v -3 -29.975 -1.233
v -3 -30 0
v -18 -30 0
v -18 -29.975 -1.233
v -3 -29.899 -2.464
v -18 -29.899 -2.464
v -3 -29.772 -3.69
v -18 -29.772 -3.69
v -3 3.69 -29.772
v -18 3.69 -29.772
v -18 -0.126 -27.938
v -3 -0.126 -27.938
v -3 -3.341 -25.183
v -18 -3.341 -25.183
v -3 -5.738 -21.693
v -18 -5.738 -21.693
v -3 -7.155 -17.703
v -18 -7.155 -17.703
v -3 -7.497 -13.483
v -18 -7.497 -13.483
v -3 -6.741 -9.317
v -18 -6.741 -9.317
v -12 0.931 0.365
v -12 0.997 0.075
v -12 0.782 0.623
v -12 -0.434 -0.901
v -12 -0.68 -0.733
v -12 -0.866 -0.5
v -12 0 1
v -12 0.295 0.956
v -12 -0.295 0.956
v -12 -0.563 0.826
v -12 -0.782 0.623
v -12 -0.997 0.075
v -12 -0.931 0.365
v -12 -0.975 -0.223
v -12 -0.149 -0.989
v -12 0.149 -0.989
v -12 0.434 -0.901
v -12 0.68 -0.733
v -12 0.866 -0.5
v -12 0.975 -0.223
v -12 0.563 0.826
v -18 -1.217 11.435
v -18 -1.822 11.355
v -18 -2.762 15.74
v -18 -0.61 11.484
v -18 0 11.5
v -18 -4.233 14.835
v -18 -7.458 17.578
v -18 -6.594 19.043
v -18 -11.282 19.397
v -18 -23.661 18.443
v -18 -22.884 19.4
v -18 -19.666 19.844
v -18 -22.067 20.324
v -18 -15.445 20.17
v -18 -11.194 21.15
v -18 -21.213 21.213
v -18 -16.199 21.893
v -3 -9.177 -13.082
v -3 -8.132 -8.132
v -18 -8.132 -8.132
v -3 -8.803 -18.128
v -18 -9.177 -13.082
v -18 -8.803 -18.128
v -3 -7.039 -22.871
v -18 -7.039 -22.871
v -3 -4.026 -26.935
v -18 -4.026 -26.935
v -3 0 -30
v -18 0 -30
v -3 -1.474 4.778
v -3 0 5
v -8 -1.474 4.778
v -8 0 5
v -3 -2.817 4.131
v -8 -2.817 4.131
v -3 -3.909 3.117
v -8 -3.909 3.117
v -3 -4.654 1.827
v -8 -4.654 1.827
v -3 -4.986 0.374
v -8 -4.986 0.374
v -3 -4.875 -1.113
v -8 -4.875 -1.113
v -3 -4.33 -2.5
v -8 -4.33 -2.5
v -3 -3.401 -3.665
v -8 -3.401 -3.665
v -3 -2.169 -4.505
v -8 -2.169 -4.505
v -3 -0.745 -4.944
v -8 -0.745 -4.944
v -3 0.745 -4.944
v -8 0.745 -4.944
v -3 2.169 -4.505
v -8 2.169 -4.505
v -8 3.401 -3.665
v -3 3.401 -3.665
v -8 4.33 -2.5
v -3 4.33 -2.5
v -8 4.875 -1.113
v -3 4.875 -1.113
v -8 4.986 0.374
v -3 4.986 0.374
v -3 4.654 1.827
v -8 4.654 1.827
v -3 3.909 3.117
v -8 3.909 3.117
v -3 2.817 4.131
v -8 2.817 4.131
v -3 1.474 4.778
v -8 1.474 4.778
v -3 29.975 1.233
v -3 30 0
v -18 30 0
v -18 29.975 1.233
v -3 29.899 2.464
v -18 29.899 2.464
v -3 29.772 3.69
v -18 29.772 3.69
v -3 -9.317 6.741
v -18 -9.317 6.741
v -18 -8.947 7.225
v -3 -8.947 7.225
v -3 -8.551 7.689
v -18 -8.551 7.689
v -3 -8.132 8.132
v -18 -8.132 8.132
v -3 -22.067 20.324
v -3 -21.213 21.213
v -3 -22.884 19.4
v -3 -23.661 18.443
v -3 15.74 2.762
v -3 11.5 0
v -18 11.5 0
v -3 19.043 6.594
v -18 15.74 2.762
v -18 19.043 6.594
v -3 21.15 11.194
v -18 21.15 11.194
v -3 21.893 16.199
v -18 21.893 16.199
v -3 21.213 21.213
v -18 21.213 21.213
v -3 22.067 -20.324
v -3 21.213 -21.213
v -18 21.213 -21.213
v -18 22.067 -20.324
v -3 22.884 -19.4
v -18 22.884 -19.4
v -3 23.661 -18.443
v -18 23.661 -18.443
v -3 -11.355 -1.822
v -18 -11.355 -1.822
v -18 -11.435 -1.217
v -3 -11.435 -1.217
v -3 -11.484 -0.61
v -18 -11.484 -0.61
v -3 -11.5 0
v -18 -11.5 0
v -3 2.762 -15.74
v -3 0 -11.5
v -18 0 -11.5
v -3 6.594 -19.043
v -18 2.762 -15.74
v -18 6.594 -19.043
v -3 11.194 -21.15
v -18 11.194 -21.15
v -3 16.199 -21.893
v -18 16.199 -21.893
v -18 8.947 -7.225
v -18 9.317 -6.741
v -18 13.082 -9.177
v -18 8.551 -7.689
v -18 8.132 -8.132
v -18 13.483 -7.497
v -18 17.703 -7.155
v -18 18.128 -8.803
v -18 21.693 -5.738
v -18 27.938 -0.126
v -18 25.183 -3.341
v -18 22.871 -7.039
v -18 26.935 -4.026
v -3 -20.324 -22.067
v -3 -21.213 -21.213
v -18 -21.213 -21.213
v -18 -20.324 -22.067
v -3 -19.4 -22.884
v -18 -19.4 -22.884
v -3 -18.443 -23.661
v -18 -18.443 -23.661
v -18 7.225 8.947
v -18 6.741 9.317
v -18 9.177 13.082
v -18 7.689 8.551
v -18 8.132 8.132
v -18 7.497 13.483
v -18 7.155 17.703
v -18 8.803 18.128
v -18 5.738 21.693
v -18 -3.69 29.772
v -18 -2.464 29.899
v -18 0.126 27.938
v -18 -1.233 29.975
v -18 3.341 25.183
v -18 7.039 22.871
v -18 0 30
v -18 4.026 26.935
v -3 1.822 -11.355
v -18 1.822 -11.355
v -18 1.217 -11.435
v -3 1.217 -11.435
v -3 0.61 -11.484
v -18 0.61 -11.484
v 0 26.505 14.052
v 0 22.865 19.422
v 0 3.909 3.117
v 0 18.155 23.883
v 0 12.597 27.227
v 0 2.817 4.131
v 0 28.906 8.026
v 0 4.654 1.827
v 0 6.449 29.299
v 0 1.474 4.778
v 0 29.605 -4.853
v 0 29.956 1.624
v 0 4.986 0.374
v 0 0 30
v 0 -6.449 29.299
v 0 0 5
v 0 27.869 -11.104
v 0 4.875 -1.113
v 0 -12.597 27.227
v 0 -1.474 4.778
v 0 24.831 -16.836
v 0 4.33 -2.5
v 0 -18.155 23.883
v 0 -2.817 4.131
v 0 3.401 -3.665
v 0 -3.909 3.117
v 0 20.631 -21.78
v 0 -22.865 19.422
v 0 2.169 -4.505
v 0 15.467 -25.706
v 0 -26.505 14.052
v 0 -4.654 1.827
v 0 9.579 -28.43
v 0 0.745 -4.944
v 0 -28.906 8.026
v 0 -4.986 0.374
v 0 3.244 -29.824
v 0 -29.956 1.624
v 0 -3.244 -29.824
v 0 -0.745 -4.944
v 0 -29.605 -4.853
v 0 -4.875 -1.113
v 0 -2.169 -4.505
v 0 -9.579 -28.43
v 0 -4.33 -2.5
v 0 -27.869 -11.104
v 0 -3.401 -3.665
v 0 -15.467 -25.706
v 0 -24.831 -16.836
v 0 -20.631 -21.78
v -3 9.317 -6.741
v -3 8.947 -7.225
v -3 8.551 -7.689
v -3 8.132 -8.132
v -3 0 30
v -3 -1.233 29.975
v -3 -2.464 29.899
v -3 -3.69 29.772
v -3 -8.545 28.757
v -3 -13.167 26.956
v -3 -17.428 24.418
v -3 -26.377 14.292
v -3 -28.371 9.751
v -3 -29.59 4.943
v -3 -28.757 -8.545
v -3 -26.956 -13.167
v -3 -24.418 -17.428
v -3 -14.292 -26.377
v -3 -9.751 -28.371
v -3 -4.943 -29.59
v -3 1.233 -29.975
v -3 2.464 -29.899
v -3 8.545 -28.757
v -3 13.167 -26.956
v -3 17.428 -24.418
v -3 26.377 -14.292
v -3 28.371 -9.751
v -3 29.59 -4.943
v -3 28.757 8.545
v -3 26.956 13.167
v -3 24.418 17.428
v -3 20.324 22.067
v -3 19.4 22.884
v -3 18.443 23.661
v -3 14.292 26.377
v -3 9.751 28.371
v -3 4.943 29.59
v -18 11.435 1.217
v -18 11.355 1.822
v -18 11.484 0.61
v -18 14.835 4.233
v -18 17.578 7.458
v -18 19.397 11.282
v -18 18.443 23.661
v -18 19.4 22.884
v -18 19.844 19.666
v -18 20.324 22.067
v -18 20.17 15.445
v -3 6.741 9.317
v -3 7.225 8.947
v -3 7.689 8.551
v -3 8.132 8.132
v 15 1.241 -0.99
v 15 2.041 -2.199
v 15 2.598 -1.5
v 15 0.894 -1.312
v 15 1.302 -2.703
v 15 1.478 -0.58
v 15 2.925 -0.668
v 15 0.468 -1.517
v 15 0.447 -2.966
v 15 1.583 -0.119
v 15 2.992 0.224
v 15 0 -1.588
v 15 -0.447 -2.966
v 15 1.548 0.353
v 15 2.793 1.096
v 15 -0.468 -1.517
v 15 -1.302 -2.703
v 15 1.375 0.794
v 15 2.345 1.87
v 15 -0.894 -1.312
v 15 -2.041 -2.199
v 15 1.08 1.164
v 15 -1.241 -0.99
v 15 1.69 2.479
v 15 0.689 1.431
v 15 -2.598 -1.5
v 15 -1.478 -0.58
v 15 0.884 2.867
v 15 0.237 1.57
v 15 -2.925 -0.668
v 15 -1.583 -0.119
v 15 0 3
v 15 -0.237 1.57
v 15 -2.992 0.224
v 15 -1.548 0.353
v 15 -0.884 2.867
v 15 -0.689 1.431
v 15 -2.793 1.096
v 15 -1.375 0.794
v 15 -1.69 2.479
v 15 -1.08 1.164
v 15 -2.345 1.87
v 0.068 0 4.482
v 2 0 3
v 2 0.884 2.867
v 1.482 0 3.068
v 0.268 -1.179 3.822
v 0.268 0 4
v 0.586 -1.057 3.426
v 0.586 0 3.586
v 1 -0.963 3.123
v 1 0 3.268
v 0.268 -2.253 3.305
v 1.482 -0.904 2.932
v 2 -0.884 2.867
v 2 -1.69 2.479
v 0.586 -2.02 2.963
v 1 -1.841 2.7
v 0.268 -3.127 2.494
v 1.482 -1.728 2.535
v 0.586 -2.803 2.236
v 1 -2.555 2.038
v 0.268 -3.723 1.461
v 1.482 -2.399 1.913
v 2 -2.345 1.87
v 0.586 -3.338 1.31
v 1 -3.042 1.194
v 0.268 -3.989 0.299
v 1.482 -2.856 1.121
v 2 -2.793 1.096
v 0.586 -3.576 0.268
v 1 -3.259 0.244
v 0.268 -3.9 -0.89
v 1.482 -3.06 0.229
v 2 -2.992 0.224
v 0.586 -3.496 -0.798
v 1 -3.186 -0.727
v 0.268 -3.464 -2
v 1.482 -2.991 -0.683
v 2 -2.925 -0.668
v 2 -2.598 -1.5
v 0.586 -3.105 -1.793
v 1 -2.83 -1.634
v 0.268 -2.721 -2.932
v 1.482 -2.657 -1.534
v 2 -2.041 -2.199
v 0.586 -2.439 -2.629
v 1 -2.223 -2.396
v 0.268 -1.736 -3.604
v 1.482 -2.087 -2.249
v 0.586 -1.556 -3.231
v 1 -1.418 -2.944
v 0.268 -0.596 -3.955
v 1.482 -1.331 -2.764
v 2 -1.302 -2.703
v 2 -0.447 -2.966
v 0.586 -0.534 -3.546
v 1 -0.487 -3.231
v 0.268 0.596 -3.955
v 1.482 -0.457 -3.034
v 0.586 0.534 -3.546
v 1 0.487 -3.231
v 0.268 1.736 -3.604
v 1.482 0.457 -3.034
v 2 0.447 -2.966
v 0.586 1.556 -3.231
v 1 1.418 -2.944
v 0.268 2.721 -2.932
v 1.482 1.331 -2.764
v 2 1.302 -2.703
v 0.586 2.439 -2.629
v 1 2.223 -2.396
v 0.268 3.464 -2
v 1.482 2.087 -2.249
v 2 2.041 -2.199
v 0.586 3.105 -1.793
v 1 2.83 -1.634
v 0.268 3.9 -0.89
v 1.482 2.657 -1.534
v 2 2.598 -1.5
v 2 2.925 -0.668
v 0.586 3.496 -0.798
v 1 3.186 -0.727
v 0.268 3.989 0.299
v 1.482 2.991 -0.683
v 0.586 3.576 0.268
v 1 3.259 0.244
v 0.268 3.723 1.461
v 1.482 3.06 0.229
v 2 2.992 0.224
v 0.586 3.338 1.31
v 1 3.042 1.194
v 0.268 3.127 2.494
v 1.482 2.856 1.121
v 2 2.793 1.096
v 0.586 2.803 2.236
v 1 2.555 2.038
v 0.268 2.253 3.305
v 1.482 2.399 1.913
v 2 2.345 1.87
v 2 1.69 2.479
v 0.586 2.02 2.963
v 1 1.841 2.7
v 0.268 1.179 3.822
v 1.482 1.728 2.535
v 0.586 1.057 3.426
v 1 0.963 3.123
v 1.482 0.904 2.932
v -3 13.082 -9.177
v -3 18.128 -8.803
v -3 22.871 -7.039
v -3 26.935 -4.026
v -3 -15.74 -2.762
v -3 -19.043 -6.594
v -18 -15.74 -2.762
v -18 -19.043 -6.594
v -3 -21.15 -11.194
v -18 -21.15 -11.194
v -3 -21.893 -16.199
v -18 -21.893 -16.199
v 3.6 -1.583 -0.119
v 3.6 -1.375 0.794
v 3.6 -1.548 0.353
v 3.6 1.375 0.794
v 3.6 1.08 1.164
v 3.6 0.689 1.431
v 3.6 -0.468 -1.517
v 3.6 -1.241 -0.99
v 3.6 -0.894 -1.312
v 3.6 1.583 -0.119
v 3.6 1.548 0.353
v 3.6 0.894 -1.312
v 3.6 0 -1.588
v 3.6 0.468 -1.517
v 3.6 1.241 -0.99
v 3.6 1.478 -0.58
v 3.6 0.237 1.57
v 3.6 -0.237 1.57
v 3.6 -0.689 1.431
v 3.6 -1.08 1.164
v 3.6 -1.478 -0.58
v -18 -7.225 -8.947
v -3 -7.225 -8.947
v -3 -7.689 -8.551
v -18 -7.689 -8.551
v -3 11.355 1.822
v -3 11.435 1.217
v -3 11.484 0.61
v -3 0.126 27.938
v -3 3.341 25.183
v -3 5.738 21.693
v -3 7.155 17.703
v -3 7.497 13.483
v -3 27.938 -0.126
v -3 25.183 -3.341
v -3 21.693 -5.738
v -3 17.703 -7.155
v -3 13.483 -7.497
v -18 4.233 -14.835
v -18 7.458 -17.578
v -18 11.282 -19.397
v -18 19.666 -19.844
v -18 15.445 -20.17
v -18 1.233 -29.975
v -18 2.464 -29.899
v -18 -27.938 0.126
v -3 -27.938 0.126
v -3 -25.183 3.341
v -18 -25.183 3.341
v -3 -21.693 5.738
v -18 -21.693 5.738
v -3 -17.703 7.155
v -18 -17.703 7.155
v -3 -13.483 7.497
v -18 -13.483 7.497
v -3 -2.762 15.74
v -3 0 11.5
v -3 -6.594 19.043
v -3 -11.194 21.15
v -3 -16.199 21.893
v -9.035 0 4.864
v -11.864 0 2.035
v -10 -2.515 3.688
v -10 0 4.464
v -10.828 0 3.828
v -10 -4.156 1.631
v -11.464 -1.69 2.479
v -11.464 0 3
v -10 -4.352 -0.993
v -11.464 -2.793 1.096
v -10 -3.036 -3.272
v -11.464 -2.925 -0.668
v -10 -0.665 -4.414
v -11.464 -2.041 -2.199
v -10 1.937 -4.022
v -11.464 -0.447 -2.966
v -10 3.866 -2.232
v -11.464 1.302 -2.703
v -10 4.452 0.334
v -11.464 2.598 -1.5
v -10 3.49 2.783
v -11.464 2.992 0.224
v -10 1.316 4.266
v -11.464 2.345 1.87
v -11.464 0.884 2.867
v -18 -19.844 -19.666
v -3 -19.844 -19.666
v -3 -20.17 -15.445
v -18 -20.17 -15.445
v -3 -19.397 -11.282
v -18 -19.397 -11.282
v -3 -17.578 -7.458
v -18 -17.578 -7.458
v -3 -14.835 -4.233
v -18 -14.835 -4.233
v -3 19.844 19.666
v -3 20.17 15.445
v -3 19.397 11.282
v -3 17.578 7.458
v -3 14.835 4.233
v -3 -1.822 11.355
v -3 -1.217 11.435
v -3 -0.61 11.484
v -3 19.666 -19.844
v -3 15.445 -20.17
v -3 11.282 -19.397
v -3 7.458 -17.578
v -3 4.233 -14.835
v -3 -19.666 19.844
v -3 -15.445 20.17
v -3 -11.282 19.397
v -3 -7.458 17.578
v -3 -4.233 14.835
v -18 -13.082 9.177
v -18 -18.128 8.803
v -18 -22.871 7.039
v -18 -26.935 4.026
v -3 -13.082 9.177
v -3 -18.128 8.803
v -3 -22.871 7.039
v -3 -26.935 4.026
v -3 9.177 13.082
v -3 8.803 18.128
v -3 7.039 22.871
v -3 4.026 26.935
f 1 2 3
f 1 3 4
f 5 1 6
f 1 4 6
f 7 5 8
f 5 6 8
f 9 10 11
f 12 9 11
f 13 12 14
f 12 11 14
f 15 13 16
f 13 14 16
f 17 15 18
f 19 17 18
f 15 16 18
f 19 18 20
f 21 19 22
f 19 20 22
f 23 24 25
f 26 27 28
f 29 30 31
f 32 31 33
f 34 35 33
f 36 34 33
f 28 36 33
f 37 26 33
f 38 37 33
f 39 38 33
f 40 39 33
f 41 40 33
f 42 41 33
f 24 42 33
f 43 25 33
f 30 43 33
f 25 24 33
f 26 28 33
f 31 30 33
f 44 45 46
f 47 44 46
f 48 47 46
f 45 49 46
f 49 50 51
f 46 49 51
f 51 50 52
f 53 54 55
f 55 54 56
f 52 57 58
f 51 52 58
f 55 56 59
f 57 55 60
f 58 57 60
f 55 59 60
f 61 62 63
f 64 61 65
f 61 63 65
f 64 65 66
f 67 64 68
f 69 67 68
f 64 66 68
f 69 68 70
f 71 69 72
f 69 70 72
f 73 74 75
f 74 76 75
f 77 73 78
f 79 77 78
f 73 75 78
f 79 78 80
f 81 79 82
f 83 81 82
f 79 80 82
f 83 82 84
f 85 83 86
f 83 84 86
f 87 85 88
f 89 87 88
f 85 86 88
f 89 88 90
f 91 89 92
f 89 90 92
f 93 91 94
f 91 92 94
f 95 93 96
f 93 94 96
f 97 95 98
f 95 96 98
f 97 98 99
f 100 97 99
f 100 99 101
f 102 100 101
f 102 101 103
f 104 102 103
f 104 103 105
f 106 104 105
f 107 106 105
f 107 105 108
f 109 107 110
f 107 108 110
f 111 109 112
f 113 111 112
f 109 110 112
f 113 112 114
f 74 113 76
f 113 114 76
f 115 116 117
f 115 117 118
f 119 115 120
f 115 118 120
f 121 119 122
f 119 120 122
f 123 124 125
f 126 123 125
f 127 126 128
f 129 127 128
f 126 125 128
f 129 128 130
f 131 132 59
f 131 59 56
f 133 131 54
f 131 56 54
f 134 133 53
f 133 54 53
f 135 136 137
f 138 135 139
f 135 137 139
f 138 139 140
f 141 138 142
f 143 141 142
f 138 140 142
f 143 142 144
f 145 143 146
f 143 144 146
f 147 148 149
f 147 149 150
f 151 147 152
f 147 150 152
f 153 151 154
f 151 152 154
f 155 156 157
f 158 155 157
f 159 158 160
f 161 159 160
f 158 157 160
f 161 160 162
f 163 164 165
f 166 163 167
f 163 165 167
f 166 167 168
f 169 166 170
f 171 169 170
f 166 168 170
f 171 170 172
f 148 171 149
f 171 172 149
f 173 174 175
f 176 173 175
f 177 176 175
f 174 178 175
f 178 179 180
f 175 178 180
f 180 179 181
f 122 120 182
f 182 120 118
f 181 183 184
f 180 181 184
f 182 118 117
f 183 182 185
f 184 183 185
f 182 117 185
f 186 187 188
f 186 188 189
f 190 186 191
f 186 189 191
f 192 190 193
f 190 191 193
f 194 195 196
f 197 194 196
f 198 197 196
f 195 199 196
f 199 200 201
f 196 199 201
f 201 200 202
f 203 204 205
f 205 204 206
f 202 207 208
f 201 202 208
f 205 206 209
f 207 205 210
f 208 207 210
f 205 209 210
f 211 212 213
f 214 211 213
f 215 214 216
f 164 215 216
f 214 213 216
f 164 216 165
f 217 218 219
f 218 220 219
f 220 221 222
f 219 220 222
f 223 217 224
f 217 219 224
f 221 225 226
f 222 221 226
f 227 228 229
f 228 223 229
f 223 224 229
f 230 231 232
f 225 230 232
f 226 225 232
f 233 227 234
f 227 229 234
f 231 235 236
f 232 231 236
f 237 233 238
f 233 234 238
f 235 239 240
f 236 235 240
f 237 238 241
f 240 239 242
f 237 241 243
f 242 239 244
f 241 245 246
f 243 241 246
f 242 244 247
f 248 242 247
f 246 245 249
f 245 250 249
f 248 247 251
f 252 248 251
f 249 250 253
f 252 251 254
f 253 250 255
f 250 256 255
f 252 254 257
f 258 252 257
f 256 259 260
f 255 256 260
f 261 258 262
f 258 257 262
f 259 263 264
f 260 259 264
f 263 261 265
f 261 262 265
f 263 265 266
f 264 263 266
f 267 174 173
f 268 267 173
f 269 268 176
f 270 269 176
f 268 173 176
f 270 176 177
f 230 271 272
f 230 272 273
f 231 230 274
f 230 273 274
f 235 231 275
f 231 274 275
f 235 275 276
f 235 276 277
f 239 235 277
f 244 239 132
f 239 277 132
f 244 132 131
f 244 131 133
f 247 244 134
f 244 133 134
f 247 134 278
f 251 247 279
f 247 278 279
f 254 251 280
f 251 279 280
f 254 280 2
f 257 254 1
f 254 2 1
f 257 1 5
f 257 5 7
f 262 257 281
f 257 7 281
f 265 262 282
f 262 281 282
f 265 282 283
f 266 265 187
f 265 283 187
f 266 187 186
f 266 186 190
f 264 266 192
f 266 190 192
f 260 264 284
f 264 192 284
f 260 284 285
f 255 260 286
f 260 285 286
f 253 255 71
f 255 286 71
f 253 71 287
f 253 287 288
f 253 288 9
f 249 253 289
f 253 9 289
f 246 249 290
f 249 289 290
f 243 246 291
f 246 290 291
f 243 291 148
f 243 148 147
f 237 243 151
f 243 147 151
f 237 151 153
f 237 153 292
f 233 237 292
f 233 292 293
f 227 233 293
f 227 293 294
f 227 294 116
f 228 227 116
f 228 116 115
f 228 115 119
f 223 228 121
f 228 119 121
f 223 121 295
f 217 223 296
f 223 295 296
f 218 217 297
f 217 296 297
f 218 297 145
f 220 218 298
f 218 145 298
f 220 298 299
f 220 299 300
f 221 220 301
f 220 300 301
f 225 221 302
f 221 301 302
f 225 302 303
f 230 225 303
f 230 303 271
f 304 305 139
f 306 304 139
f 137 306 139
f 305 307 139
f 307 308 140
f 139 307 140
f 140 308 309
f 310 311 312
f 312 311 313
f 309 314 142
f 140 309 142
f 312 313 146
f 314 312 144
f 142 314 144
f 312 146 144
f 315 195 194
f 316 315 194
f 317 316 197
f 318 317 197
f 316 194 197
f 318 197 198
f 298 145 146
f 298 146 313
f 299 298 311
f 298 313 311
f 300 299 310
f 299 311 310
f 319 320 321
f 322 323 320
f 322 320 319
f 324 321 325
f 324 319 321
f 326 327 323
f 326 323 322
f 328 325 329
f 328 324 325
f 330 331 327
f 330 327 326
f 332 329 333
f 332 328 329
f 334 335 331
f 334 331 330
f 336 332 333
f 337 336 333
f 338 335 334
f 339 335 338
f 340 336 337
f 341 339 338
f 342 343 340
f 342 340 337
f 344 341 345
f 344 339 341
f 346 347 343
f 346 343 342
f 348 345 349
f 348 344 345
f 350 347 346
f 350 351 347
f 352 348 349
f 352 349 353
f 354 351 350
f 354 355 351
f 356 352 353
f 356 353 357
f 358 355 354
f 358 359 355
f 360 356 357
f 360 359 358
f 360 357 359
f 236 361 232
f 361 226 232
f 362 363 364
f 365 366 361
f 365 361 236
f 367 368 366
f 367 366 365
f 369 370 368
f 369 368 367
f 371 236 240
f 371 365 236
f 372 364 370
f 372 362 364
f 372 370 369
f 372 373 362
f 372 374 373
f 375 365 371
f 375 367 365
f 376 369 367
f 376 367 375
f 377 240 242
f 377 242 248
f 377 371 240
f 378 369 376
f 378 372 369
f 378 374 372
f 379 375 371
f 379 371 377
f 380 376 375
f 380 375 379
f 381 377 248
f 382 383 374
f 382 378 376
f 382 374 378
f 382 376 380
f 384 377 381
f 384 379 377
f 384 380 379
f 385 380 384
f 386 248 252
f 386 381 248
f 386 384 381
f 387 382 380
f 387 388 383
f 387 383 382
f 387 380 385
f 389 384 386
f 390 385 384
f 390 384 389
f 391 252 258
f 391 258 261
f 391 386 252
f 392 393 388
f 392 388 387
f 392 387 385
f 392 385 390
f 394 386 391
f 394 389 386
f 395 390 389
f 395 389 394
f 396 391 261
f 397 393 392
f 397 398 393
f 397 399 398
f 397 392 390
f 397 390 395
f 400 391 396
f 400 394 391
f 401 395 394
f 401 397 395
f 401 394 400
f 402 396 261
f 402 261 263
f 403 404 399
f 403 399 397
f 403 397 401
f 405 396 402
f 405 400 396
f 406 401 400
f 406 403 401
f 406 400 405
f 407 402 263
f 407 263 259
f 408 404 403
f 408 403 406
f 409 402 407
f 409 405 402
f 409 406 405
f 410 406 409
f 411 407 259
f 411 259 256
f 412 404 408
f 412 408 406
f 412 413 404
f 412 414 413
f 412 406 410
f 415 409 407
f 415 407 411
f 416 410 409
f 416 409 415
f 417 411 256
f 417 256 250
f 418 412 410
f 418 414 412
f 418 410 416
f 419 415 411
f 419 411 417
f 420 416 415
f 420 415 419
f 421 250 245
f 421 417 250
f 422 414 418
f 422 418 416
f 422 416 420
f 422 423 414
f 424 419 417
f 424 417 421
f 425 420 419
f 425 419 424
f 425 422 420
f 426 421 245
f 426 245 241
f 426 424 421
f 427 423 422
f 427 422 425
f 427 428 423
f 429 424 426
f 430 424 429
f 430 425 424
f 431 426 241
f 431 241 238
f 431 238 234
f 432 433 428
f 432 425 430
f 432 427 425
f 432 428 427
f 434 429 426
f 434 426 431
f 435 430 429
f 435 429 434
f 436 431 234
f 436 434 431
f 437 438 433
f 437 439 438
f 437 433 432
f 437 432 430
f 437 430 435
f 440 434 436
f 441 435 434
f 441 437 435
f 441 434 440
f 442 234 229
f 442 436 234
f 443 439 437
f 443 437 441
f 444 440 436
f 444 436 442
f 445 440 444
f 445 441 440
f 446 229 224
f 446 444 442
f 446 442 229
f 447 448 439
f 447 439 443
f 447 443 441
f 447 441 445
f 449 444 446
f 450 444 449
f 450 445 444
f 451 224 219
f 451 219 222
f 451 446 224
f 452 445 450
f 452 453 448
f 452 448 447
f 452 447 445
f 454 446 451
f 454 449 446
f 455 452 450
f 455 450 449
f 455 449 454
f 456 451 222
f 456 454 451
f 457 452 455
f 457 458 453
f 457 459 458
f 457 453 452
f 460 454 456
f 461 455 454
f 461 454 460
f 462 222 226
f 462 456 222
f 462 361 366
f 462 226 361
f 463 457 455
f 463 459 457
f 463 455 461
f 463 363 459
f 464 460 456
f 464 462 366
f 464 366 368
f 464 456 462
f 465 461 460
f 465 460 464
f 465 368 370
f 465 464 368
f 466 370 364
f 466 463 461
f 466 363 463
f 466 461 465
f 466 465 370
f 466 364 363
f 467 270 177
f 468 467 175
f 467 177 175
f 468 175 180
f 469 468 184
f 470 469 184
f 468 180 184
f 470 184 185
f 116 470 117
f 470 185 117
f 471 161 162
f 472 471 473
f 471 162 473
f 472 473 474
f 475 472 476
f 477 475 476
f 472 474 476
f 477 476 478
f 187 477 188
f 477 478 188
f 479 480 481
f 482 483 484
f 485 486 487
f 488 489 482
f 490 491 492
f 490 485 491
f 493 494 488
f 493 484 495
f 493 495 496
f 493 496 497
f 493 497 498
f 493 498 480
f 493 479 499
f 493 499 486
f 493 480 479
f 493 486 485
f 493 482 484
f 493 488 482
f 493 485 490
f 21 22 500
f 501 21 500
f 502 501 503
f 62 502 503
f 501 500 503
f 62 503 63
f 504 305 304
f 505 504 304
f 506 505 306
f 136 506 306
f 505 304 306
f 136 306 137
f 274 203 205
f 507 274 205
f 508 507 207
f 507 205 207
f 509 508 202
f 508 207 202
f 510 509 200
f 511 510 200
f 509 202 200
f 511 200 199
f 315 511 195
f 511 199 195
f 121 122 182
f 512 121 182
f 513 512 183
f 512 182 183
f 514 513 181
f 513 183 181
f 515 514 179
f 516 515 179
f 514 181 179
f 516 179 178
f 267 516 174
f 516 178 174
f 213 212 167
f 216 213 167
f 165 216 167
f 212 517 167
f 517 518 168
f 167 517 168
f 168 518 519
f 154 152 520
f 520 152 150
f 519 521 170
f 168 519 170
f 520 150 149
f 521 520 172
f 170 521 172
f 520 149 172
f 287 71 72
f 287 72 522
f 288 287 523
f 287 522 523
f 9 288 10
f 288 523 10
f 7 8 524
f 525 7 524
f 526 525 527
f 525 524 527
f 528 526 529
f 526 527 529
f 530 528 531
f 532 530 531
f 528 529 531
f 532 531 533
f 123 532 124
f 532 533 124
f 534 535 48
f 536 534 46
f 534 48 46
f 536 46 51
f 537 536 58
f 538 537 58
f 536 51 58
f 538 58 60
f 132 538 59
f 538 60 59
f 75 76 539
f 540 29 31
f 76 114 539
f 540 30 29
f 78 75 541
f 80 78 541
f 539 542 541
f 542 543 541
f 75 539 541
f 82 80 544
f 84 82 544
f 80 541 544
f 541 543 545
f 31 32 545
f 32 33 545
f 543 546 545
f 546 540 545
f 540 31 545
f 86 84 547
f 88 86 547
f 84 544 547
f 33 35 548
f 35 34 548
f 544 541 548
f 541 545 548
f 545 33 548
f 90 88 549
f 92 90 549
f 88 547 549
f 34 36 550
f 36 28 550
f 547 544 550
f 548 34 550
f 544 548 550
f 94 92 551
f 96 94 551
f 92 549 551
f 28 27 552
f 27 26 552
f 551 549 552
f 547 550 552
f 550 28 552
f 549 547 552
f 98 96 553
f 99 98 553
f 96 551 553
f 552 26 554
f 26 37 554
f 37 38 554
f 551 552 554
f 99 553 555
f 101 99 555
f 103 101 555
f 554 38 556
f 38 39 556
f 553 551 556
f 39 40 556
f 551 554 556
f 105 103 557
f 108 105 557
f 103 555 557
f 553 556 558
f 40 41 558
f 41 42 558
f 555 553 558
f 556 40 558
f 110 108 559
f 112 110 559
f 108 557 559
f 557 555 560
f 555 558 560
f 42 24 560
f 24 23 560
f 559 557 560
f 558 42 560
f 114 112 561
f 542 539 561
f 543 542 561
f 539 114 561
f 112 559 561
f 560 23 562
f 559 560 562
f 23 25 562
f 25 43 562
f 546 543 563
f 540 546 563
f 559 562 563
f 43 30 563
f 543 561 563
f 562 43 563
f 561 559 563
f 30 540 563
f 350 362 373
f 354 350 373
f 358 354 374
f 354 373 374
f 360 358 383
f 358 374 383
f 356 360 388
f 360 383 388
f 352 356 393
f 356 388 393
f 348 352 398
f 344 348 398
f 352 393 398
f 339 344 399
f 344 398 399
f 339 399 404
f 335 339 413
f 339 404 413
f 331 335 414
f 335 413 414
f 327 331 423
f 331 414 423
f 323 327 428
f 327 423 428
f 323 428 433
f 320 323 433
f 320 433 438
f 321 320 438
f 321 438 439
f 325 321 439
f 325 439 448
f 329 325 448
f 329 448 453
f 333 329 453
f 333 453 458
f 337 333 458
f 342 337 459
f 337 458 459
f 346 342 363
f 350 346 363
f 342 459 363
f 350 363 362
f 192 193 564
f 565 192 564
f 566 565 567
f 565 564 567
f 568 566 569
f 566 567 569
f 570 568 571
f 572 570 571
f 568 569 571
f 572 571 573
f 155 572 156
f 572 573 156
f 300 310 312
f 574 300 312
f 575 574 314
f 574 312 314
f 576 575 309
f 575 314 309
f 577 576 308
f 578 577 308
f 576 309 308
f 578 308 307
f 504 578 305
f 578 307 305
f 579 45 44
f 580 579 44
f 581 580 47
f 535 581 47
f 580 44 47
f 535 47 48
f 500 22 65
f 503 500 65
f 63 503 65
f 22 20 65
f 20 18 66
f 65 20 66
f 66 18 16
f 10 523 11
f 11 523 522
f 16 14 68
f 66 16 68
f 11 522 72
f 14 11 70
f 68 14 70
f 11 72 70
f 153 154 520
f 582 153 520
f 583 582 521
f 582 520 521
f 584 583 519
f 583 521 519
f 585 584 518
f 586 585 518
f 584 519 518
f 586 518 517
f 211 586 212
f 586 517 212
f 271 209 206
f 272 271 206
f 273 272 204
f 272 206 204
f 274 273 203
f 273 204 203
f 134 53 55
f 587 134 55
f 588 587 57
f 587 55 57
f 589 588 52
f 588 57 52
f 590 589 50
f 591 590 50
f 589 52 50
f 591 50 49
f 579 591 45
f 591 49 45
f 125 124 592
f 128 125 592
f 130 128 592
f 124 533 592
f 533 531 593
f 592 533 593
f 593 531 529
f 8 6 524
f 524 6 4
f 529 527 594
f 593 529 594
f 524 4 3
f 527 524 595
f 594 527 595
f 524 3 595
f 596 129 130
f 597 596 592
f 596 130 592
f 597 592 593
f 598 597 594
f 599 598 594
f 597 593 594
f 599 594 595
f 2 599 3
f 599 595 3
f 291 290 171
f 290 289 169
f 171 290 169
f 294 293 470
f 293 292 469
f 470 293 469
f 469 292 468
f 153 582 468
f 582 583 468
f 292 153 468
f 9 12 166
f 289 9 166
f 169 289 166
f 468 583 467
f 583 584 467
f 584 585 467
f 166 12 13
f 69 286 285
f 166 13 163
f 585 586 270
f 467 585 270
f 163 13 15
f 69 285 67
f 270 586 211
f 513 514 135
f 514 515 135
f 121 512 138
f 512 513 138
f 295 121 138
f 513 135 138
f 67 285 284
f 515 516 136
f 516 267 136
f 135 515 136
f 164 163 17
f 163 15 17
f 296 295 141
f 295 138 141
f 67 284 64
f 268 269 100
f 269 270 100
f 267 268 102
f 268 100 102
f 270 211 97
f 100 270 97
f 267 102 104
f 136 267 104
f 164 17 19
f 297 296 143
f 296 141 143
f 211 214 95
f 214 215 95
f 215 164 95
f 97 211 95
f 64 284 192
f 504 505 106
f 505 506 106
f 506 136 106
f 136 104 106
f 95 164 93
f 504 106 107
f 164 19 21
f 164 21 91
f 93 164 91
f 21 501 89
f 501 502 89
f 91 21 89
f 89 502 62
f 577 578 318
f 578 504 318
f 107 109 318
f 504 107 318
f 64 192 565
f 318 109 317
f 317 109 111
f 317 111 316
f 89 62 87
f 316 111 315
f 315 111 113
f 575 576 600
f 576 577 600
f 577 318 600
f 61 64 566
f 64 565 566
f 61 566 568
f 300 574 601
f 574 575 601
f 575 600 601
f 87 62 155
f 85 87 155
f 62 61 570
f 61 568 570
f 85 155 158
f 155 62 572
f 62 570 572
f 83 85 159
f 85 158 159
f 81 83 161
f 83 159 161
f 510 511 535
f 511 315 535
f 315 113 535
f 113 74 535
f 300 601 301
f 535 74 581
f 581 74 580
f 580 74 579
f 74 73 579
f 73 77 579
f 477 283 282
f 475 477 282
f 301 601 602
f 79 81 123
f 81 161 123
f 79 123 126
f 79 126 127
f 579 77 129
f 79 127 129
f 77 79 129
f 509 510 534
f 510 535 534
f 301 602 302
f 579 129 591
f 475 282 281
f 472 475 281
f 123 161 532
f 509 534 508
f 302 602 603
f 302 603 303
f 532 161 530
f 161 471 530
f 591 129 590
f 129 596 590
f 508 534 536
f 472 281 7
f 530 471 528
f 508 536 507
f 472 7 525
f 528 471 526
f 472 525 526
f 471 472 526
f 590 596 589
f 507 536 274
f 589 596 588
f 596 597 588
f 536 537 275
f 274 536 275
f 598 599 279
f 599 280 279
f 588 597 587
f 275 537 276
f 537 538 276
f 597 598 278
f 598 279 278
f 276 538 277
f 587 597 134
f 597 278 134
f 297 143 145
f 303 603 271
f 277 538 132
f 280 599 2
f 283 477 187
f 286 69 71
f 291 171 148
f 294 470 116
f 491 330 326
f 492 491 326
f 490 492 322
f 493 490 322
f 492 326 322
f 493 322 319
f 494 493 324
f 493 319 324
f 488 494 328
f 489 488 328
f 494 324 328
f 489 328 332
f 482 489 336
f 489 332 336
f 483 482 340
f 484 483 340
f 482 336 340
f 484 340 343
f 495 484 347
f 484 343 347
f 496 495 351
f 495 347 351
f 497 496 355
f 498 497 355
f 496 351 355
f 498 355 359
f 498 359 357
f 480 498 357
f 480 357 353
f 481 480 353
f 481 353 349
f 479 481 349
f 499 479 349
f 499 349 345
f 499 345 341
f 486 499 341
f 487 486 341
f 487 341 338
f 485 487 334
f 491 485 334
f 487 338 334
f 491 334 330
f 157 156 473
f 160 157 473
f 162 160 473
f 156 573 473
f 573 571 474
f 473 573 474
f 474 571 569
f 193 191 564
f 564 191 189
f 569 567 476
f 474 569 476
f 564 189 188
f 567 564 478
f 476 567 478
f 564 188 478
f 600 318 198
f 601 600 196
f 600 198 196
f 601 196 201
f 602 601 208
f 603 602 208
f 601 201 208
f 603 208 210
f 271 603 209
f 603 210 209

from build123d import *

# Parameters (mm, degrees)
BOSS_EXTRUDE1_START = 15
BOSS_EXTRUDE1_DEPTH = 15
CIRPATTERN1_COUNT   = 8
SKETCH4_R           = 3
BOSS_EXTRUDE2_DEPTH = 15
SKETCH5_R           = 1.58775
CUT_EXTRUDE1_DEPTH  = 11.4
FILLET3_R           = 2


with BuildPart() as part:
    # Sketch1 → Revolve1 (revolve)
    with BuildSketch(Plane(origin=(0, 0, 0), x_dir=(1, 0, 0), z_dir=(0, 1, 0)), mode=Mode.PRIVATE) as revolve1_sk:
        with BuildLine():
            Line((0, 0), (0, 30))
            Line((0, 30), (-3, 30))
            Line((-3, 30), (-3, 5))
            Line((-3, 5), (-8, 5))
            ThreePointArc((-8, 5), (-10.828427125, 3.828427125), (-12, 1))
            Line((-12, 1), (-12, 0))
            Line((-12, 0), (0, 0))
        make_face()
    revolve(revolve1_sk.sketch.rotate(Axis((-12, 0, 0), (1, 0, 0)), 180), axis=Axis((-12, 0, 0), (1, 0, 0)))

    # Sketch2 → Boss-Extrude1 (add)
    with BuildSketch(Plane.ZY.offset(3).offset(BOSS_EXTRUDE1_START)):
        with BuildLine():
            ThreePointArc((-6.74081952, 9.317260982), (-7.459861891, 8.752168906), (-8.131727984, 8.131727984))
            ThreePointArc((-8.131727984, 8.131727984), (-8.088596883, 20.561719247), (0, 30))
            ThreePointArc((0, 30), (1.848623078, 29.942989041), (3.690220038, 29.772172848))
            ThreePointArc((3.690220038, 29.772172848), (-5.738161973, 21.693077802), (-6.74081952, 9.317260982))
        make_face()
    boss_extrude1 = extrude(amount=-BOSS_EXTRUDE1_DEPTH)

    # CirPattern1: Boss-Extrude1 ×8 about axis
    cirpattern1_axis = Axis((0, 0, 0), (1, 0, 0))
    for i in range(1, CIRPATTERN1_COUNT):
        add(boss_extrude1.rotate(cirpattern1_axis, i * 360 / CIRPATTERN1_COUNT))

    # Sketch4 → Boss-Extrude2 (add)
    with BuildSketch(Plane(origin=(0, 0, 0), x_dir=(0, 0, -1), z_dir=(1, 0, 0))):
        with Locations(Location((0, 0, 0), (0, 0, 180))):
            Circle(SKETCH4_R)
    extrude(amount=BOSS_EXTRUDE2_DEPTH)

    # Sketch5 → Cut-Extrude1 (cut)
    with BuildSketch(Plane(origin=(15, 0, 0), x_dir=(0, 0, -1), z_dir=(1, 0, 0))):
        Circle(SKETCH5_R)
    extrude(amount=-CUT_EXTRUDE1_DEPTH, mode=Mode.SUBTRACT)

    # Fillet3
    fillet3_edges = [part.edges().sort_by_distance(p)[0] for p in [
        (0, 0, -3),
    ]]
    fillet(fillet3_edges, radius=FILLET3_R)


solid = part.part
